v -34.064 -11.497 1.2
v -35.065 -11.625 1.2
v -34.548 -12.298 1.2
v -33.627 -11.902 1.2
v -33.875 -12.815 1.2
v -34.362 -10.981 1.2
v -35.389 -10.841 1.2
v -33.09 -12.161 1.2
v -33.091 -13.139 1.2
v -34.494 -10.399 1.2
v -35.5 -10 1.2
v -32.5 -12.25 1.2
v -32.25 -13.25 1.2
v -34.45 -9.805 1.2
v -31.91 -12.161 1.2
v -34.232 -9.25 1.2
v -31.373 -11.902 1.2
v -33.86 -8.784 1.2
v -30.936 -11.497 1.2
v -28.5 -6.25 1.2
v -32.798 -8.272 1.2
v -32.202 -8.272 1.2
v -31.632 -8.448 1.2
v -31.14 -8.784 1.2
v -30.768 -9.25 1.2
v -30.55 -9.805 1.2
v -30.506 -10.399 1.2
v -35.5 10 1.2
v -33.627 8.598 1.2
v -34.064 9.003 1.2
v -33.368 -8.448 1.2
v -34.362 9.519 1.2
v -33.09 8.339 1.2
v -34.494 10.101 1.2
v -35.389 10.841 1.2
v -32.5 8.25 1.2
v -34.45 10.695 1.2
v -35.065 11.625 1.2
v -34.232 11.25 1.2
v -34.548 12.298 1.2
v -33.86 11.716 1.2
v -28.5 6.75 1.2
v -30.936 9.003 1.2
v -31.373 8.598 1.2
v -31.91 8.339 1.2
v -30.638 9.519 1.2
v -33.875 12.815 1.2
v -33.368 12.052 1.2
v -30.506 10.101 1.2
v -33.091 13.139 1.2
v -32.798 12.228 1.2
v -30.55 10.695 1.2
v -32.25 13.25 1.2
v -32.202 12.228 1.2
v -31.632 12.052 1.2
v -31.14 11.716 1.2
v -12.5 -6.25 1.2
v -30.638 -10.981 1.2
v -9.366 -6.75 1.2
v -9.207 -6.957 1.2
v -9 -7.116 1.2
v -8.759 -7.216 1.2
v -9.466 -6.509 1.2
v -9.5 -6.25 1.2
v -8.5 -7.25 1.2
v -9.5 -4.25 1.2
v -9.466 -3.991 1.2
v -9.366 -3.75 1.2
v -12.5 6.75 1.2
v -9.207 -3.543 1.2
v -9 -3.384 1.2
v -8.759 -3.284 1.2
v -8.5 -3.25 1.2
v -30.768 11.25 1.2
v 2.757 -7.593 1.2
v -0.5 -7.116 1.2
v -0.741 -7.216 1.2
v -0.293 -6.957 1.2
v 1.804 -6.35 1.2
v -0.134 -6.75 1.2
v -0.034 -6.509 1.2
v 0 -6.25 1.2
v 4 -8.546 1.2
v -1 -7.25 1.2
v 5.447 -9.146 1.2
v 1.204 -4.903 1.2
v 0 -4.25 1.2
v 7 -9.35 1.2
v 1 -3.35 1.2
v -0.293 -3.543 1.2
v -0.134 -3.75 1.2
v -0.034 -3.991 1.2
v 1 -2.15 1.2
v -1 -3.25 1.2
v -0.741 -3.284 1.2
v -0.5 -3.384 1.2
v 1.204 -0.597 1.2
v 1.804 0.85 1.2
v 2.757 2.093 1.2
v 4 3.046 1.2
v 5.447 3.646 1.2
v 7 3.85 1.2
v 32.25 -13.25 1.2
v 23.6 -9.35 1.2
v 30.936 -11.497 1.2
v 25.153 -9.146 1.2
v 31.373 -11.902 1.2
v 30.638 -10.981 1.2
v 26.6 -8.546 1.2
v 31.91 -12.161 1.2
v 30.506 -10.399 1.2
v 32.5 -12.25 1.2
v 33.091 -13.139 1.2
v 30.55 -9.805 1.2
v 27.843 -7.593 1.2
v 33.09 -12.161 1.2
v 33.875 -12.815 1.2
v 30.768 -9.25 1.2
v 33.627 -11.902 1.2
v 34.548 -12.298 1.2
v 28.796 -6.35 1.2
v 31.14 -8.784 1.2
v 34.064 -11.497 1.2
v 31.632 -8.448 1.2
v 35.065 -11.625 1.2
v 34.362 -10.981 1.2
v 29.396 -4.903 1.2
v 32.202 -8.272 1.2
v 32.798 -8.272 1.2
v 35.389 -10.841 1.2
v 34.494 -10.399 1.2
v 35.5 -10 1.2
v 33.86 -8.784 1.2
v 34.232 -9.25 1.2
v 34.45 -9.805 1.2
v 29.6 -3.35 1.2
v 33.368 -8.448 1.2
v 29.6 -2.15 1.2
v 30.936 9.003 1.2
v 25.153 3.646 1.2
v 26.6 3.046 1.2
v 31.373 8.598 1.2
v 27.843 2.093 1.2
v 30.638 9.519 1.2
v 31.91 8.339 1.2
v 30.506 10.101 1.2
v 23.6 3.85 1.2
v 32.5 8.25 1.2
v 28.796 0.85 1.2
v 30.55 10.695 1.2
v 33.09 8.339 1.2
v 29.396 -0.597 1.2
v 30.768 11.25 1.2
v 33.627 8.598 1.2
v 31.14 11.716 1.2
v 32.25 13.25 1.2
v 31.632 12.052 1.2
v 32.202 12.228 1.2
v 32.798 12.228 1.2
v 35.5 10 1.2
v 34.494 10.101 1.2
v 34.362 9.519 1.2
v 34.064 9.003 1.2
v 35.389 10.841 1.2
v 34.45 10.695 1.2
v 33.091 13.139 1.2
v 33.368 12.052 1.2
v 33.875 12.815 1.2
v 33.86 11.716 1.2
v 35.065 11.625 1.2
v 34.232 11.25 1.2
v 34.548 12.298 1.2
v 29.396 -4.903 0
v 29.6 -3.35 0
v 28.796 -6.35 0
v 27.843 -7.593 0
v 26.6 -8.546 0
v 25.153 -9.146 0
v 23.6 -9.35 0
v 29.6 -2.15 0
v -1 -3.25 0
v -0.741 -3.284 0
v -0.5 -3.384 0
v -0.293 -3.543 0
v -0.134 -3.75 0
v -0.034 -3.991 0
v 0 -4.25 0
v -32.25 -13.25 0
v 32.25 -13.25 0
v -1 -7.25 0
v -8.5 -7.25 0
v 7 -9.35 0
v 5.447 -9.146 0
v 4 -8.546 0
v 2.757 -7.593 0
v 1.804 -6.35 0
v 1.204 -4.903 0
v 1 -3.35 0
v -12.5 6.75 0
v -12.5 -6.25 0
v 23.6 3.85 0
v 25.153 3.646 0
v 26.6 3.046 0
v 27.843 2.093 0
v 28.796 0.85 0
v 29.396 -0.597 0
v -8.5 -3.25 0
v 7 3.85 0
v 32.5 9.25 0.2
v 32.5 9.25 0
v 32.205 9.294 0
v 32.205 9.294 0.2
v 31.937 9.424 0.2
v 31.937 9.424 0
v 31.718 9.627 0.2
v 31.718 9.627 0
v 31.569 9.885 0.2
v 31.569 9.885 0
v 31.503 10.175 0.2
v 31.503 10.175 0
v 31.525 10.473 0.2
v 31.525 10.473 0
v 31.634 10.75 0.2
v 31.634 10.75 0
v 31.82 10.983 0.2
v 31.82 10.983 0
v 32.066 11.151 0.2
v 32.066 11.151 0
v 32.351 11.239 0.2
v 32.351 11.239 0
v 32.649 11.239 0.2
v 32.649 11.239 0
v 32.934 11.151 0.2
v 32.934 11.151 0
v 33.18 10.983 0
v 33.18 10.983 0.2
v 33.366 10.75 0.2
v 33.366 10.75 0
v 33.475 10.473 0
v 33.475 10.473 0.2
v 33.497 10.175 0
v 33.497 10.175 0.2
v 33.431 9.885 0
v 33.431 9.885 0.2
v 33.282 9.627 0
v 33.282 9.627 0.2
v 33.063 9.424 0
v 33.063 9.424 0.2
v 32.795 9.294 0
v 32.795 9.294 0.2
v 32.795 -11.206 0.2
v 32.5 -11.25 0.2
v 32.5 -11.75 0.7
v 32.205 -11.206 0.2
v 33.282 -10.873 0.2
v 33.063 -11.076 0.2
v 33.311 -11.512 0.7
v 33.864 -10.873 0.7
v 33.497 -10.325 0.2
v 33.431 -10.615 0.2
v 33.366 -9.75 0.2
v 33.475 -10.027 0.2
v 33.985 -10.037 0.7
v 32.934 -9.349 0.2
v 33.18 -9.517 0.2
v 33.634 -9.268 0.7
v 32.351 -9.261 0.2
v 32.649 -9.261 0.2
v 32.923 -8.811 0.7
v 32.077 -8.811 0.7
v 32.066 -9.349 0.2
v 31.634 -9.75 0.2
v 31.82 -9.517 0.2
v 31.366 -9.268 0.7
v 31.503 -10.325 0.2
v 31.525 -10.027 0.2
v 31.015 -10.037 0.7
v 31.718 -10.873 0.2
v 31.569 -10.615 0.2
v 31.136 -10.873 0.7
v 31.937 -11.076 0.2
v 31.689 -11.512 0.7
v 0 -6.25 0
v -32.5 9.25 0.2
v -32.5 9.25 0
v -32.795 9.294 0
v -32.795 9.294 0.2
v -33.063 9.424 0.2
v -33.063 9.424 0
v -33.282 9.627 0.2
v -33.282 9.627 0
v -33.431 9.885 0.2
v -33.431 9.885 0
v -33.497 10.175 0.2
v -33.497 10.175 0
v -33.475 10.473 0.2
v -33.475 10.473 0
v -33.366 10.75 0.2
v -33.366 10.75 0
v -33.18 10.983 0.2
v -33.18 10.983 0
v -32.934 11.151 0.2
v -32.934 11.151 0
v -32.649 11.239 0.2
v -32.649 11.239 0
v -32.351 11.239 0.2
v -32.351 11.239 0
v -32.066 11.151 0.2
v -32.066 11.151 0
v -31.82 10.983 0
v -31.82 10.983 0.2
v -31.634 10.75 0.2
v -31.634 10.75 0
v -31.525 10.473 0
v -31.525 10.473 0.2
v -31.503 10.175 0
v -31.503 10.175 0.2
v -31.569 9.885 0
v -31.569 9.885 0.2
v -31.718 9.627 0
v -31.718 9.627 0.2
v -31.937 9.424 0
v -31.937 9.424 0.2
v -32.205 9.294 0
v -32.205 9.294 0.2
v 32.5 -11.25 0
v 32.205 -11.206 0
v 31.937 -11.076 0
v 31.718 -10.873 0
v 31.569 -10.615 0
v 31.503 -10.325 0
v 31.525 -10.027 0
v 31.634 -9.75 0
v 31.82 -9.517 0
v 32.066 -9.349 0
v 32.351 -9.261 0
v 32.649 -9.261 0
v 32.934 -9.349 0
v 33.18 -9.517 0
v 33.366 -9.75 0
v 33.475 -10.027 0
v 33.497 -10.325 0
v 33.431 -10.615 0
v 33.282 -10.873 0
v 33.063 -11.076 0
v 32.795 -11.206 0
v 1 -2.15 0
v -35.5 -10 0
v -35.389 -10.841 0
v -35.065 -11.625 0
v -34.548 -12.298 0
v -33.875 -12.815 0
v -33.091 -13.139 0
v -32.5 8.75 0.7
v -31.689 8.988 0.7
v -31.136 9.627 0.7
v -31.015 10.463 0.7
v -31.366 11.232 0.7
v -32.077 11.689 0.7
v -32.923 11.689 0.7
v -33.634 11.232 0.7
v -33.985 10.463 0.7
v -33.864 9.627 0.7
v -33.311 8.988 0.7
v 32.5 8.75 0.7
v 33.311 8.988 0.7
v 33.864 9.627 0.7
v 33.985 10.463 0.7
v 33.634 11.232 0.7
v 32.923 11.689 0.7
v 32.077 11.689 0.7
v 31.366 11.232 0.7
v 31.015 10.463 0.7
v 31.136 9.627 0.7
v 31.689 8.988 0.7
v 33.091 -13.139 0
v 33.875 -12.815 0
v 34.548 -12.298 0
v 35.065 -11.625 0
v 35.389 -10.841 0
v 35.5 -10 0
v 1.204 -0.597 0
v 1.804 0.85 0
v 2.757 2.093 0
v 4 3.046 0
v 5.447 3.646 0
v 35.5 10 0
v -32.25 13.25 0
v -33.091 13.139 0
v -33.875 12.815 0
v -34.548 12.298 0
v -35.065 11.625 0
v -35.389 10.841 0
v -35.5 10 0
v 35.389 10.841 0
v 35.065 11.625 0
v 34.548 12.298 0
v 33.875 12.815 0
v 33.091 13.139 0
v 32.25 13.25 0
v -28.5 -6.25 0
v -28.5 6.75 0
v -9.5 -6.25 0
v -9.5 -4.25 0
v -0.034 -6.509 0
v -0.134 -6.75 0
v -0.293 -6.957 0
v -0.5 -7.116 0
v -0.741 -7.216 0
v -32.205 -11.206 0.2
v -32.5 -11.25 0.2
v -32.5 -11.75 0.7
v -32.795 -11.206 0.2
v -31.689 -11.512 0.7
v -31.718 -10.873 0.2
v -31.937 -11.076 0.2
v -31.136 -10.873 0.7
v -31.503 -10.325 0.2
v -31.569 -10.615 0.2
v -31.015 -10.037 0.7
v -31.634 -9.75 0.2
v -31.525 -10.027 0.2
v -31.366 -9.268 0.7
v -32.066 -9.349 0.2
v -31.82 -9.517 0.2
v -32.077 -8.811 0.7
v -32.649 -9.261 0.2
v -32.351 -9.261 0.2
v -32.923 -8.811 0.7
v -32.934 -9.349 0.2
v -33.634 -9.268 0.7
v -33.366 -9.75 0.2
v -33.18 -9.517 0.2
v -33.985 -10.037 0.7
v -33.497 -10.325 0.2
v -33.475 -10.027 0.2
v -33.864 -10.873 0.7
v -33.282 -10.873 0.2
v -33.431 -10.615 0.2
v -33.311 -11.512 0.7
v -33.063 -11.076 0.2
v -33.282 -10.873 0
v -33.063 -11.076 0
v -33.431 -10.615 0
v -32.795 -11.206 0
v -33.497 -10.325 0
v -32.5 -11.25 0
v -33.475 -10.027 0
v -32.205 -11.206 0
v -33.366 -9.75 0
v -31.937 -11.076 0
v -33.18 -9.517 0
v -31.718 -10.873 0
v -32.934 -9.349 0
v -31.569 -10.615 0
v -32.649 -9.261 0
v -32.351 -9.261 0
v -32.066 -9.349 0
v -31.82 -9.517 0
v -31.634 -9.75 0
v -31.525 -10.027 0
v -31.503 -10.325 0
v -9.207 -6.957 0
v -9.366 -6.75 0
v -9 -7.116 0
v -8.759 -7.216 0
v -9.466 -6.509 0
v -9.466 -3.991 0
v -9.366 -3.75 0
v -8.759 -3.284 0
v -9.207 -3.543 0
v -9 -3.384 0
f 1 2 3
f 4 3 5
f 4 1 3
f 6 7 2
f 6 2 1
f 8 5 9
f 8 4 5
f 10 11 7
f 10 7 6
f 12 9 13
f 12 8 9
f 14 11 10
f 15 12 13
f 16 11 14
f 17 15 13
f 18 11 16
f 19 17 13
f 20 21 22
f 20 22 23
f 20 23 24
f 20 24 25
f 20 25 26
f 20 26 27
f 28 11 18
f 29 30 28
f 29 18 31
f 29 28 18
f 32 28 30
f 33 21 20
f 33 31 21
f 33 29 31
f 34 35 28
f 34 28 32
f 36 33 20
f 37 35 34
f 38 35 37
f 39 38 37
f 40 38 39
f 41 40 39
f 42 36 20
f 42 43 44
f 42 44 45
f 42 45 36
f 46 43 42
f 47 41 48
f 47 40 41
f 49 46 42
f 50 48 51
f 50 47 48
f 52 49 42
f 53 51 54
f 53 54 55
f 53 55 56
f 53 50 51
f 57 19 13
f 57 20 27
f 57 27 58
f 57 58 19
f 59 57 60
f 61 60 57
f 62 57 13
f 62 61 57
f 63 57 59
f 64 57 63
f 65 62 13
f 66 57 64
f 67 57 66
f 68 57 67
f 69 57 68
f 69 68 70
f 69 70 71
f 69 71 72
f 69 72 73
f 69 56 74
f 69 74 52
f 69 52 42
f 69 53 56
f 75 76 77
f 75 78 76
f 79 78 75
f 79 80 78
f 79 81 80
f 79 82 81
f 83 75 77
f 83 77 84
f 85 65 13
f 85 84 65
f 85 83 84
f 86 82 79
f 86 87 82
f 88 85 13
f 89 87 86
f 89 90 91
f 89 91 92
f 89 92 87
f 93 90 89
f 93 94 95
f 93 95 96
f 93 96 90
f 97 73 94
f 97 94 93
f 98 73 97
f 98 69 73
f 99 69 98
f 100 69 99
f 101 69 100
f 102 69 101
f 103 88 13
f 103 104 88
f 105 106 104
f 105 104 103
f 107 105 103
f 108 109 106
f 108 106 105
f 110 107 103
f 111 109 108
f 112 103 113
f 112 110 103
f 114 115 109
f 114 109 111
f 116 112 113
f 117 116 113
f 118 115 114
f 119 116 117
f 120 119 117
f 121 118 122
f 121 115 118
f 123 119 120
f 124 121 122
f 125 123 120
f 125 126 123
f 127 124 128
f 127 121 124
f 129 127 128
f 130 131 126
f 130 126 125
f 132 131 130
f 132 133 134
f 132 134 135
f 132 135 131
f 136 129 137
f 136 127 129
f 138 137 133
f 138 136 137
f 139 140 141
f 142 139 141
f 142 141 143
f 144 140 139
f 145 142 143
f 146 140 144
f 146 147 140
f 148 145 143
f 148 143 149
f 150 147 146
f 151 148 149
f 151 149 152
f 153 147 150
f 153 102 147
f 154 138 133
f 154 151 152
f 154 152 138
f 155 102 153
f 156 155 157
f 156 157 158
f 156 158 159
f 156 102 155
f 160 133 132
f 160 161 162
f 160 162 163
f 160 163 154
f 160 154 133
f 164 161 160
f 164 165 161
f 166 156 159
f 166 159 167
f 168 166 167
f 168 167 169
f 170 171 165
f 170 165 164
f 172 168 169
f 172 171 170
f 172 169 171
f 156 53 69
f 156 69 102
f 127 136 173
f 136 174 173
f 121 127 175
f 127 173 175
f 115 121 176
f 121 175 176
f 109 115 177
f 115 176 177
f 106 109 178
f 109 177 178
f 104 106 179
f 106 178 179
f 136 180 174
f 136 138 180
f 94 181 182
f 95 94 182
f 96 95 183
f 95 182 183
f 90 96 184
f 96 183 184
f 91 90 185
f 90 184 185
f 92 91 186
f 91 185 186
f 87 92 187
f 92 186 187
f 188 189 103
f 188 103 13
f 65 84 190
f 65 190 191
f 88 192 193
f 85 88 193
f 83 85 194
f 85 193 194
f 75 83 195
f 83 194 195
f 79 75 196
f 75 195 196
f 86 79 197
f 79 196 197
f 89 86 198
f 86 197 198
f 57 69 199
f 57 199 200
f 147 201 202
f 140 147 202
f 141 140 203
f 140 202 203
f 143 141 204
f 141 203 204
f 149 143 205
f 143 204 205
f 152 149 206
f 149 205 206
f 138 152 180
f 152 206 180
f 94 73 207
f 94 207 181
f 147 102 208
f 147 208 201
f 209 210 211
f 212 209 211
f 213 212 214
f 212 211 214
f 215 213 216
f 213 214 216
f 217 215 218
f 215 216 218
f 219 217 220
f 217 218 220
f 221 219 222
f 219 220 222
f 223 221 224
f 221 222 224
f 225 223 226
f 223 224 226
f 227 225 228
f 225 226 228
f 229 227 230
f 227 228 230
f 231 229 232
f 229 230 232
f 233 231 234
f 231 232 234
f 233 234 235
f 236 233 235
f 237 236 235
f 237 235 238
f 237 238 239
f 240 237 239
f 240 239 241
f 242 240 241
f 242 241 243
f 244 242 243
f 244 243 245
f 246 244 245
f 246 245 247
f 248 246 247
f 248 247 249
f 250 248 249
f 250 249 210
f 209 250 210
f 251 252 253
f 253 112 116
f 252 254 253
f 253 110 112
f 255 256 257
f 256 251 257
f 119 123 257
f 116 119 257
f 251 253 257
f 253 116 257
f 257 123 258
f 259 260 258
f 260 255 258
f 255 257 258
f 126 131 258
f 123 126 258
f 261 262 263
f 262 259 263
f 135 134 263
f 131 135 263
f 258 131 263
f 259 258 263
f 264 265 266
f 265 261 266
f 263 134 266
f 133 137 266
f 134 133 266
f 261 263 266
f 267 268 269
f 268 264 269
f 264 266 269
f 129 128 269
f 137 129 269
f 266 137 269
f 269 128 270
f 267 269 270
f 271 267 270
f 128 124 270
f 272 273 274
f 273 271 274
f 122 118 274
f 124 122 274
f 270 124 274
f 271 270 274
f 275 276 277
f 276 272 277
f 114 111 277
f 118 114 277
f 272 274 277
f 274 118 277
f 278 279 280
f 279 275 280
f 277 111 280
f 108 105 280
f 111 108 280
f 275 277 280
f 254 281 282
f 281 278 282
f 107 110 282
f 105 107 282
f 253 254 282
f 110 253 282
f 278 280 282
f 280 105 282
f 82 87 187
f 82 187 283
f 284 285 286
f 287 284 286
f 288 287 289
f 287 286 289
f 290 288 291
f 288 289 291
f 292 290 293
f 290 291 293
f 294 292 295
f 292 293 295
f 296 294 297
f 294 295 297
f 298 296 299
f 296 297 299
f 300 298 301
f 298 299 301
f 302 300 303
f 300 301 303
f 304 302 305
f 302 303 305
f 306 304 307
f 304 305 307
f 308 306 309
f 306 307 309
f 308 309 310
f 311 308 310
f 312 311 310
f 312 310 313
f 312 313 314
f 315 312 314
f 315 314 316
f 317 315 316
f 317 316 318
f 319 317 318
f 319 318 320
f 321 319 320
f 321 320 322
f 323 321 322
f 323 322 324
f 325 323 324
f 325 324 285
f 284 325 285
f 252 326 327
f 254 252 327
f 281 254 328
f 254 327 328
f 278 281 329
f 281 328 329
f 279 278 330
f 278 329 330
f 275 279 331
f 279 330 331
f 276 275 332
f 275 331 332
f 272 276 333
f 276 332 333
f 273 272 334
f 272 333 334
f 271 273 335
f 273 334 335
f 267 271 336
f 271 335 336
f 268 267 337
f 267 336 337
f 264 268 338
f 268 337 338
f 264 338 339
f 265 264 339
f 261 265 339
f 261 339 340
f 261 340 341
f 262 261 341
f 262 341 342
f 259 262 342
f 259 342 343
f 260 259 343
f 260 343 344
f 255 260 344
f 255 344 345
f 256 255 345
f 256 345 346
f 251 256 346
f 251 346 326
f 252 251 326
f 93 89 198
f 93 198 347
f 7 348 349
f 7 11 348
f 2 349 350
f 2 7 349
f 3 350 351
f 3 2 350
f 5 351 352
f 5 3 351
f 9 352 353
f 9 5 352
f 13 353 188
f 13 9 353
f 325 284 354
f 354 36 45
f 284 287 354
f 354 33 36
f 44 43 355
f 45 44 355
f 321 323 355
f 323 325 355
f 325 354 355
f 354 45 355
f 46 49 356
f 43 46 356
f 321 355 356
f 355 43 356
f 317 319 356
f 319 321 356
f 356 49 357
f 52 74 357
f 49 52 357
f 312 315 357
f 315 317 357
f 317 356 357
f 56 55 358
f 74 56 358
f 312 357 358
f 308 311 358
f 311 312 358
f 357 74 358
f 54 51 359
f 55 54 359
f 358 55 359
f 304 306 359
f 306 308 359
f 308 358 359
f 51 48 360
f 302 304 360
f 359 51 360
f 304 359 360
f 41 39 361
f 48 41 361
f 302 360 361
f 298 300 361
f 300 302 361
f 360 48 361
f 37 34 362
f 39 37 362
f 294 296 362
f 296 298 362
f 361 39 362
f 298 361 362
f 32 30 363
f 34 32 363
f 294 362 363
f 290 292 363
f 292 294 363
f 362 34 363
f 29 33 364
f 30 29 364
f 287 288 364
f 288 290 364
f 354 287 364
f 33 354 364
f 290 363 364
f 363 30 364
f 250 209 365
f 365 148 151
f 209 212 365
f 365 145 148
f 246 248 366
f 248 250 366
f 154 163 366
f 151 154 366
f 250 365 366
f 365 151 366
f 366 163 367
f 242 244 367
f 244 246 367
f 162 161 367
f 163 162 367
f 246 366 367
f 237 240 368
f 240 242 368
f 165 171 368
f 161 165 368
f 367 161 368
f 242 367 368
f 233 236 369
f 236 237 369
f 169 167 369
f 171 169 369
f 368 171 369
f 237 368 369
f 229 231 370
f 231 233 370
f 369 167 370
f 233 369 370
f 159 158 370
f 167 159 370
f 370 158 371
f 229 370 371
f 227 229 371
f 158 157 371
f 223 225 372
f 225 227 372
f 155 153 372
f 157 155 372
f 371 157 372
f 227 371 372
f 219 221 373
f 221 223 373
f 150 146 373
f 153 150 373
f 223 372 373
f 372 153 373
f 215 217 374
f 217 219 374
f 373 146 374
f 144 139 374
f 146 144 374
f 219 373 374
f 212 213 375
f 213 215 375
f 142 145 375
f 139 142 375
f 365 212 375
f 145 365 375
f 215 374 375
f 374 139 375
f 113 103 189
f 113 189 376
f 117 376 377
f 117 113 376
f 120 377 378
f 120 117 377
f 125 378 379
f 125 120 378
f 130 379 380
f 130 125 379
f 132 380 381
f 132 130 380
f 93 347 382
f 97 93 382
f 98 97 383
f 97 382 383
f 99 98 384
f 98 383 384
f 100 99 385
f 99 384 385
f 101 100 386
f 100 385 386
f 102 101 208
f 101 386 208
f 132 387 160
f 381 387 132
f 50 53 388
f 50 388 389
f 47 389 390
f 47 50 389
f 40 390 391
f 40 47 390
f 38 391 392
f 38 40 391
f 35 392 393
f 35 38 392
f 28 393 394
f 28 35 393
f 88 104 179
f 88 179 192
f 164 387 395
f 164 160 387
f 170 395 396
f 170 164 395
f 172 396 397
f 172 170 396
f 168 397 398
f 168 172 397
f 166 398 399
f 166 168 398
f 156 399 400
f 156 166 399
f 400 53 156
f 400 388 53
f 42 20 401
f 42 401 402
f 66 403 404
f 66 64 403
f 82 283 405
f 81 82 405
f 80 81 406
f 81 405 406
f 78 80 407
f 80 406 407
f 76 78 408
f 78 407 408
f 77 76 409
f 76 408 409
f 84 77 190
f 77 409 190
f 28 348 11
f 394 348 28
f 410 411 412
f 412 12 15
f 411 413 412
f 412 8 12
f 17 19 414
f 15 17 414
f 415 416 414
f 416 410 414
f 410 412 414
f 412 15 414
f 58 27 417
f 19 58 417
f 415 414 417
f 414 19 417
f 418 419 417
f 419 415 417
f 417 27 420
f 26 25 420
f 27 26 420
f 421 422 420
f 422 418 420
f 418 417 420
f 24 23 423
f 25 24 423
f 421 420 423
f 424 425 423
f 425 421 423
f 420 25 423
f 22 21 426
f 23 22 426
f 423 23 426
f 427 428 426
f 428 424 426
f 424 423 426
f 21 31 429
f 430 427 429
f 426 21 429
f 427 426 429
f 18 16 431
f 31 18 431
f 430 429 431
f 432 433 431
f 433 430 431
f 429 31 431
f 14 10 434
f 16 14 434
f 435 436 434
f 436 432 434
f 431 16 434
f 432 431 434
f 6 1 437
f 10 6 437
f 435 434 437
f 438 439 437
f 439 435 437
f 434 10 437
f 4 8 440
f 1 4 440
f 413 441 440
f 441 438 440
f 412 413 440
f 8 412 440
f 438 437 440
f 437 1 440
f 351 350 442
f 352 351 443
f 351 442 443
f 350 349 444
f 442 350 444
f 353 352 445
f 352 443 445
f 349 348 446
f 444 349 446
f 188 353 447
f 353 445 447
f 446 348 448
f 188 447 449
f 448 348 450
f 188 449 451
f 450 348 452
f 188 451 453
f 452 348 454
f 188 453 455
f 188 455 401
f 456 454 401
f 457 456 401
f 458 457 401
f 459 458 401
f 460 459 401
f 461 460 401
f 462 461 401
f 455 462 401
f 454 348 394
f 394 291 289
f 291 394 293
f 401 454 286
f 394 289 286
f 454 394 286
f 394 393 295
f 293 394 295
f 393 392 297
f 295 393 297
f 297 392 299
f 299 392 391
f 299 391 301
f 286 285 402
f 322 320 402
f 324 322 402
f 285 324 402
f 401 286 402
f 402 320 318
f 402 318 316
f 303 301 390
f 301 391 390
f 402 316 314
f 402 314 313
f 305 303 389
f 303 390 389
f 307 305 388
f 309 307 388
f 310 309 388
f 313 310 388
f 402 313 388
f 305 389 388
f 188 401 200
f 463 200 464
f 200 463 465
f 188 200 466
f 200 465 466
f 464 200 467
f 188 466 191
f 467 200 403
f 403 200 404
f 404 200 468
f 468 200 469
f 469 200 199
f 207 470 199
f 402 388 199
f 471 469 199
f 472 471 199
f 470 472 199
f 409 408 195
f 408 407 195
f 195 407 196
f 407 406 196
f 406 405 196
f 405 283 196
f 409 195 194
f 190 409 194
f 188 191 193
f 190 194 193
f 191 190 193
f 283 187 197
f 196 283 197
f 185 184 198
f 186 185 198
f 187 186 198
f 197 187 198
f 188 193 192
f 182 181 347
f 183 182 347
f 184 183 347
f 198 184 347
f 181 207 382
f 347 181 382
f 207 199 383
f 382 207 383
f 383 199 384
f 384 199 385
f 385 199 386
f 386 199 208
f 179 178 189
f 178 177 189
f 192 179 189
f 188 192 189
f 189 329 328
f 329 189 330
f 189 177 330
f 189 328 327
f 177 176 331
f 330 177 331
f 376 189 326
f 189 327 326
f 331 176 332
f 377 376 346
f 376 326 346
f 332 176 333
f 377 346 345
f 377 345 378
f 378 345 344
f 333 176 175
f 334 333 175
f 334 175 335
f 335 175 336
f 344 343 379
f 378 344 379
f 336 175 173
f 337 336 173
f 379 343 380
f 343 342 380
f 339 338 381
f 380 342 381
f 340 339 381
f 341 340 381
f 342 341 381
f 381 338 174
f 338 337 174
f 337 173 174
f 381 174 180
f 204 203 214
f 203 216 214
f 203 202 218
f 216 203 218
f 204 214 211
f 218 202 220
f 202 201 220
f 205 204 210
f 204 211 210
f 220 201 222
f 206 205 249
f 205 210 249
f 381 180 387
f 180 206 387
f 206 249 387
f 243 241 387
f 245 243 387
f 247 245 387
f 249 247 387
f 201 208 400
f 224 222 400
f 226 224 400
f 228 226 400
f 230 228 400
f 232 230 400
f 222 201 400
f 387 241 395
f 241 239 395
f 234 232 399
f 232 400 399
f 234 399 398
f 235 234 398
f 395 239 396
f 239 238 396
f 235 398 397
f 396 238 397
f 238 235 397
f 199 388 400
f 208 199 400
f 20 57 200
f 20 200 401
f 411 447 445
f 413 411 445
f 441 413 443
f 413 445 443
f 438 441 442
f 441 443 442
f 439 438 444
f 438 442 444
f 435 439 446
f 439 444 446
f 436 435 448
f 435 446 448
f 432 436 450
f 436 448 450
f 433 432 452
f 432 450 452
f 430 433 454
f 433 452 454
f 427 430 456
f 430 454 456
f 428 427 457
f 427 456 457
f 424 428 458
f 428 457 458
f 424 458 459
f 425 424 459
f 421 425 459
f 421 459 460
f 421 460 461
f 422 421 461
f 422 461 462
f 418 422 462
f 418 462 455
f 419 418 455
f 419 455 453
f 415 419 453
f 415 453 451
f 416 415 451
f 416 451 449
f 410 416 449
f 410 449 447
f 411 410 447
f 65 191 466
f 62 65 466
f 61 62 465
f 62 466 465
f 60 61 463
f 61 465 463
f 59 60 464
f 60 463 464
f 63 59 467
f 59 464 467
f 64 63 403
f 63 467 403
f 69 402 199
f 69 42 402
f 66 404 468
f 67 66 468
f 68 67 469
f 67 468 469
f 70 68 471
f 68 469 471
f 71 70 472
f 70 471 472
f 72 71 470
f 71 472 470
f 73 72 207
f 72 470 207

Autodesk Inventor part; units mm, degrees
ref_plane "YZ Plane" through (0, 0, 0) normal (1, 0, 0) x (0, 1, 0)
ref_plane "XZ Plane" through (0, 0, 0) normal (0, 1, 0) x (-1, 0, 0)
ref_plane "XY Plane" through (0, 0, 0) normal (0, 0, 1) x (1, 0, 0)
sketch "Sketch1" plane through (0, 0, 0) normal (0, 0, 1) x (1, 0, 0)
  line L0 (-35.5, 13.25) -> (35.5, 13.25)
  line L1 (35.5, 13.25) -> (35.5, -13.25)
  line L2 (35.5, -13.25) -> (-35.5, -13.25)
  line L3 (-35.5, -13.25) -> (-35.5, 13.25)
  point P0 (0, 0)
  dimension "d0" = 26.5
  dimension "d1" = 71
  dimension "d2" = 35.5
  dimension "d3" = 13.25
extrude "Extrusion1" add sketch "Sketch1" along normal blind 1.2
fillet "Fillet1" radius 3.25 4 edges at (-35.5, 13.25, 0.6) (-35.5, -13.25, 0.6) (35.5, -13.25, 0.6) (35.5, 13.25, 0.6)
sketch "Sketch2" plane through (0, 0, 1.2) normal (0, 0, 1) x (1, 0, 0)
  line L0 (32.25, 13.25) -> (-32.25, 13.25) projected
  line L1 (-35.5, 10) -> (-35.5, -10) projected
  line L2 (-32.25, -13.25) -> (32.25, -13.25) projected
  line L3 (35.5, -10) -> (35.5, 10) projected
  point P0 (0, 0)
  point P1 (-32.5, 10.25)
  point P2 (32.5, 10.25)
  point P3 (32.5, -10.25)
  point P4 (-32.5, -10.25)
  dimension "d7" = 3
  dimension "d8" = 3
  dimension "d9" = 3
  dimension "d10" = 3
  dimension "d11" = 3
  dimension "d12" = 3
  dimension "d13" = 3
  dimension "d14" = 3
hole "Hole1" at (-32.5, 10.25, 1.2) at (32.5, 10.25, 1.2) at (32.5, -10.25, 1.2) at (-32.5, -10.25, 1.2) direction (0, 0, -1) diameter 2 depth 4 tip angle 118 countersink diameter 4 countersink angle 90
sketch "Sketch3" plane through (0, 0, 1.2) normal (0, 0, 1) x (1, 0, 0)
  line L0 (-28.5, 6.75) -> (-12.5, 6.75)
  line L1 (-12.5, 6.75) -> (-12.5, -6.25)
  line L2 (-12.5, -6.25) -> (-28.5, -6.25)
  line L3 (-28.5, -6.25) -> (-28.5, 6.75)
  line L4 (-35.5, 10) -> (-35.5, -10) projected
  line L5 (-32.25, -13.25) -> (32.25, -13.25) projected
  point P0 (0, 0)
  dimension "d22" = 7
  dimension "d23" = 23
  dimension "d24" = 7
  dimension "d25" = 20
extrude "Extrusion2" cut sketch "Sketch3" against normal blind 2
sketch "Sketch4" plane through (0, 0, 1.2) normal (0, 0, 1) x (1, 0, 0)
  line L0 (-9.5, -3.25) -> (0, -3.25)
  line L1 (0, -3.25) -> (0, -7.25)
  line L2 (0, -7.25) -> (-9.5, -7.25)
  line L3 (-9.5, -7.25) -> (-9.5, -3.25)
  line L4 (-35.5, 10) -> (-35.5, -10) projected
  line L5 (-32.25, -13.25) -> (32.25, -13.25) projected
  point P0 (0, 0)
  dimension "d28" = 26
  dimension "d29" = 35.5
  dimension "d30" = 6
  dimension "d31" = 10
extrude "Extrusion3" cut sketch "Sketch4" against normal blind 2
sketch "Sketch5" plane through (0, 0, 1.2) normal (0, 0, 1) x (1, 0, 0)
  line L0 (6.5, 1.75) -> (24.5, 1.75)
  line L1 (24.5, 1.75) -> (24.5, -5.25)
  line L2 (24.5, -5.25) -> (6.5, -5.25)
  line L3 (6.5, -5.25) -> (6.5, 1.75)
  line L4 (35.5, -10) -> (35.5, 10) projected
  line L5 (-32.25, -13.25) -> (32.25, -13.25) projected
  point P0 (0, 0)
  dimension "d34" = 11
  dimension "d35" = 29
  dimension "d36" = 15
  dimension "d37" = 8
extrude "Extrusion4" cut sketch "Sketch5" against normal blind 2
chamfer "Chamfer1" distance 2 angle 45 2 edges at (6.5, -5.25, 0.6) (24.5, -5.25, 0.6)
fillet "Fillet2" radius 1 4 edges at (-9.5, -3.25, 0.6) (-9.5, -7.25, 0.6) (0, -7.25, 0.6) (0, -3.25, 0.6)
sketch "Sketch7" plane through (0, 0, 1.2) normal (0, 0, 1) x (1, 0, 0)
  line L0 (1, 3.85) -> (29.6, 3.85)
  line L1 (29.6, 3.85) -> (29.6, -9.35)
  line L2 (29.6, -9.35) -> (1, -9.35)
  line L3 (1, -9.35) -> (1, 3.85)
  line L4 (-32.25, -13.25) -> (32.25, -13.25) projected
  line L5 (35.5, -10) -> (35.5, 10) projected
  point P0 (0, 0)
  dimension "d56" = 3.9
  dimension "d57" = 5.9
  dimension "d58" = 17.1
  dimension "d59" = 34.5
extrude "Extrusion6" cut sketch "Sketch7" against normal blind 2
fillet "Fillet3" radius 6 4 edges at (1, 3.85, 0.6) (1, -9.35, 0.6) (29.6, 3.85, 0.6) (29.6, -9.35, 0.6)
properties part number "cover-slave"
